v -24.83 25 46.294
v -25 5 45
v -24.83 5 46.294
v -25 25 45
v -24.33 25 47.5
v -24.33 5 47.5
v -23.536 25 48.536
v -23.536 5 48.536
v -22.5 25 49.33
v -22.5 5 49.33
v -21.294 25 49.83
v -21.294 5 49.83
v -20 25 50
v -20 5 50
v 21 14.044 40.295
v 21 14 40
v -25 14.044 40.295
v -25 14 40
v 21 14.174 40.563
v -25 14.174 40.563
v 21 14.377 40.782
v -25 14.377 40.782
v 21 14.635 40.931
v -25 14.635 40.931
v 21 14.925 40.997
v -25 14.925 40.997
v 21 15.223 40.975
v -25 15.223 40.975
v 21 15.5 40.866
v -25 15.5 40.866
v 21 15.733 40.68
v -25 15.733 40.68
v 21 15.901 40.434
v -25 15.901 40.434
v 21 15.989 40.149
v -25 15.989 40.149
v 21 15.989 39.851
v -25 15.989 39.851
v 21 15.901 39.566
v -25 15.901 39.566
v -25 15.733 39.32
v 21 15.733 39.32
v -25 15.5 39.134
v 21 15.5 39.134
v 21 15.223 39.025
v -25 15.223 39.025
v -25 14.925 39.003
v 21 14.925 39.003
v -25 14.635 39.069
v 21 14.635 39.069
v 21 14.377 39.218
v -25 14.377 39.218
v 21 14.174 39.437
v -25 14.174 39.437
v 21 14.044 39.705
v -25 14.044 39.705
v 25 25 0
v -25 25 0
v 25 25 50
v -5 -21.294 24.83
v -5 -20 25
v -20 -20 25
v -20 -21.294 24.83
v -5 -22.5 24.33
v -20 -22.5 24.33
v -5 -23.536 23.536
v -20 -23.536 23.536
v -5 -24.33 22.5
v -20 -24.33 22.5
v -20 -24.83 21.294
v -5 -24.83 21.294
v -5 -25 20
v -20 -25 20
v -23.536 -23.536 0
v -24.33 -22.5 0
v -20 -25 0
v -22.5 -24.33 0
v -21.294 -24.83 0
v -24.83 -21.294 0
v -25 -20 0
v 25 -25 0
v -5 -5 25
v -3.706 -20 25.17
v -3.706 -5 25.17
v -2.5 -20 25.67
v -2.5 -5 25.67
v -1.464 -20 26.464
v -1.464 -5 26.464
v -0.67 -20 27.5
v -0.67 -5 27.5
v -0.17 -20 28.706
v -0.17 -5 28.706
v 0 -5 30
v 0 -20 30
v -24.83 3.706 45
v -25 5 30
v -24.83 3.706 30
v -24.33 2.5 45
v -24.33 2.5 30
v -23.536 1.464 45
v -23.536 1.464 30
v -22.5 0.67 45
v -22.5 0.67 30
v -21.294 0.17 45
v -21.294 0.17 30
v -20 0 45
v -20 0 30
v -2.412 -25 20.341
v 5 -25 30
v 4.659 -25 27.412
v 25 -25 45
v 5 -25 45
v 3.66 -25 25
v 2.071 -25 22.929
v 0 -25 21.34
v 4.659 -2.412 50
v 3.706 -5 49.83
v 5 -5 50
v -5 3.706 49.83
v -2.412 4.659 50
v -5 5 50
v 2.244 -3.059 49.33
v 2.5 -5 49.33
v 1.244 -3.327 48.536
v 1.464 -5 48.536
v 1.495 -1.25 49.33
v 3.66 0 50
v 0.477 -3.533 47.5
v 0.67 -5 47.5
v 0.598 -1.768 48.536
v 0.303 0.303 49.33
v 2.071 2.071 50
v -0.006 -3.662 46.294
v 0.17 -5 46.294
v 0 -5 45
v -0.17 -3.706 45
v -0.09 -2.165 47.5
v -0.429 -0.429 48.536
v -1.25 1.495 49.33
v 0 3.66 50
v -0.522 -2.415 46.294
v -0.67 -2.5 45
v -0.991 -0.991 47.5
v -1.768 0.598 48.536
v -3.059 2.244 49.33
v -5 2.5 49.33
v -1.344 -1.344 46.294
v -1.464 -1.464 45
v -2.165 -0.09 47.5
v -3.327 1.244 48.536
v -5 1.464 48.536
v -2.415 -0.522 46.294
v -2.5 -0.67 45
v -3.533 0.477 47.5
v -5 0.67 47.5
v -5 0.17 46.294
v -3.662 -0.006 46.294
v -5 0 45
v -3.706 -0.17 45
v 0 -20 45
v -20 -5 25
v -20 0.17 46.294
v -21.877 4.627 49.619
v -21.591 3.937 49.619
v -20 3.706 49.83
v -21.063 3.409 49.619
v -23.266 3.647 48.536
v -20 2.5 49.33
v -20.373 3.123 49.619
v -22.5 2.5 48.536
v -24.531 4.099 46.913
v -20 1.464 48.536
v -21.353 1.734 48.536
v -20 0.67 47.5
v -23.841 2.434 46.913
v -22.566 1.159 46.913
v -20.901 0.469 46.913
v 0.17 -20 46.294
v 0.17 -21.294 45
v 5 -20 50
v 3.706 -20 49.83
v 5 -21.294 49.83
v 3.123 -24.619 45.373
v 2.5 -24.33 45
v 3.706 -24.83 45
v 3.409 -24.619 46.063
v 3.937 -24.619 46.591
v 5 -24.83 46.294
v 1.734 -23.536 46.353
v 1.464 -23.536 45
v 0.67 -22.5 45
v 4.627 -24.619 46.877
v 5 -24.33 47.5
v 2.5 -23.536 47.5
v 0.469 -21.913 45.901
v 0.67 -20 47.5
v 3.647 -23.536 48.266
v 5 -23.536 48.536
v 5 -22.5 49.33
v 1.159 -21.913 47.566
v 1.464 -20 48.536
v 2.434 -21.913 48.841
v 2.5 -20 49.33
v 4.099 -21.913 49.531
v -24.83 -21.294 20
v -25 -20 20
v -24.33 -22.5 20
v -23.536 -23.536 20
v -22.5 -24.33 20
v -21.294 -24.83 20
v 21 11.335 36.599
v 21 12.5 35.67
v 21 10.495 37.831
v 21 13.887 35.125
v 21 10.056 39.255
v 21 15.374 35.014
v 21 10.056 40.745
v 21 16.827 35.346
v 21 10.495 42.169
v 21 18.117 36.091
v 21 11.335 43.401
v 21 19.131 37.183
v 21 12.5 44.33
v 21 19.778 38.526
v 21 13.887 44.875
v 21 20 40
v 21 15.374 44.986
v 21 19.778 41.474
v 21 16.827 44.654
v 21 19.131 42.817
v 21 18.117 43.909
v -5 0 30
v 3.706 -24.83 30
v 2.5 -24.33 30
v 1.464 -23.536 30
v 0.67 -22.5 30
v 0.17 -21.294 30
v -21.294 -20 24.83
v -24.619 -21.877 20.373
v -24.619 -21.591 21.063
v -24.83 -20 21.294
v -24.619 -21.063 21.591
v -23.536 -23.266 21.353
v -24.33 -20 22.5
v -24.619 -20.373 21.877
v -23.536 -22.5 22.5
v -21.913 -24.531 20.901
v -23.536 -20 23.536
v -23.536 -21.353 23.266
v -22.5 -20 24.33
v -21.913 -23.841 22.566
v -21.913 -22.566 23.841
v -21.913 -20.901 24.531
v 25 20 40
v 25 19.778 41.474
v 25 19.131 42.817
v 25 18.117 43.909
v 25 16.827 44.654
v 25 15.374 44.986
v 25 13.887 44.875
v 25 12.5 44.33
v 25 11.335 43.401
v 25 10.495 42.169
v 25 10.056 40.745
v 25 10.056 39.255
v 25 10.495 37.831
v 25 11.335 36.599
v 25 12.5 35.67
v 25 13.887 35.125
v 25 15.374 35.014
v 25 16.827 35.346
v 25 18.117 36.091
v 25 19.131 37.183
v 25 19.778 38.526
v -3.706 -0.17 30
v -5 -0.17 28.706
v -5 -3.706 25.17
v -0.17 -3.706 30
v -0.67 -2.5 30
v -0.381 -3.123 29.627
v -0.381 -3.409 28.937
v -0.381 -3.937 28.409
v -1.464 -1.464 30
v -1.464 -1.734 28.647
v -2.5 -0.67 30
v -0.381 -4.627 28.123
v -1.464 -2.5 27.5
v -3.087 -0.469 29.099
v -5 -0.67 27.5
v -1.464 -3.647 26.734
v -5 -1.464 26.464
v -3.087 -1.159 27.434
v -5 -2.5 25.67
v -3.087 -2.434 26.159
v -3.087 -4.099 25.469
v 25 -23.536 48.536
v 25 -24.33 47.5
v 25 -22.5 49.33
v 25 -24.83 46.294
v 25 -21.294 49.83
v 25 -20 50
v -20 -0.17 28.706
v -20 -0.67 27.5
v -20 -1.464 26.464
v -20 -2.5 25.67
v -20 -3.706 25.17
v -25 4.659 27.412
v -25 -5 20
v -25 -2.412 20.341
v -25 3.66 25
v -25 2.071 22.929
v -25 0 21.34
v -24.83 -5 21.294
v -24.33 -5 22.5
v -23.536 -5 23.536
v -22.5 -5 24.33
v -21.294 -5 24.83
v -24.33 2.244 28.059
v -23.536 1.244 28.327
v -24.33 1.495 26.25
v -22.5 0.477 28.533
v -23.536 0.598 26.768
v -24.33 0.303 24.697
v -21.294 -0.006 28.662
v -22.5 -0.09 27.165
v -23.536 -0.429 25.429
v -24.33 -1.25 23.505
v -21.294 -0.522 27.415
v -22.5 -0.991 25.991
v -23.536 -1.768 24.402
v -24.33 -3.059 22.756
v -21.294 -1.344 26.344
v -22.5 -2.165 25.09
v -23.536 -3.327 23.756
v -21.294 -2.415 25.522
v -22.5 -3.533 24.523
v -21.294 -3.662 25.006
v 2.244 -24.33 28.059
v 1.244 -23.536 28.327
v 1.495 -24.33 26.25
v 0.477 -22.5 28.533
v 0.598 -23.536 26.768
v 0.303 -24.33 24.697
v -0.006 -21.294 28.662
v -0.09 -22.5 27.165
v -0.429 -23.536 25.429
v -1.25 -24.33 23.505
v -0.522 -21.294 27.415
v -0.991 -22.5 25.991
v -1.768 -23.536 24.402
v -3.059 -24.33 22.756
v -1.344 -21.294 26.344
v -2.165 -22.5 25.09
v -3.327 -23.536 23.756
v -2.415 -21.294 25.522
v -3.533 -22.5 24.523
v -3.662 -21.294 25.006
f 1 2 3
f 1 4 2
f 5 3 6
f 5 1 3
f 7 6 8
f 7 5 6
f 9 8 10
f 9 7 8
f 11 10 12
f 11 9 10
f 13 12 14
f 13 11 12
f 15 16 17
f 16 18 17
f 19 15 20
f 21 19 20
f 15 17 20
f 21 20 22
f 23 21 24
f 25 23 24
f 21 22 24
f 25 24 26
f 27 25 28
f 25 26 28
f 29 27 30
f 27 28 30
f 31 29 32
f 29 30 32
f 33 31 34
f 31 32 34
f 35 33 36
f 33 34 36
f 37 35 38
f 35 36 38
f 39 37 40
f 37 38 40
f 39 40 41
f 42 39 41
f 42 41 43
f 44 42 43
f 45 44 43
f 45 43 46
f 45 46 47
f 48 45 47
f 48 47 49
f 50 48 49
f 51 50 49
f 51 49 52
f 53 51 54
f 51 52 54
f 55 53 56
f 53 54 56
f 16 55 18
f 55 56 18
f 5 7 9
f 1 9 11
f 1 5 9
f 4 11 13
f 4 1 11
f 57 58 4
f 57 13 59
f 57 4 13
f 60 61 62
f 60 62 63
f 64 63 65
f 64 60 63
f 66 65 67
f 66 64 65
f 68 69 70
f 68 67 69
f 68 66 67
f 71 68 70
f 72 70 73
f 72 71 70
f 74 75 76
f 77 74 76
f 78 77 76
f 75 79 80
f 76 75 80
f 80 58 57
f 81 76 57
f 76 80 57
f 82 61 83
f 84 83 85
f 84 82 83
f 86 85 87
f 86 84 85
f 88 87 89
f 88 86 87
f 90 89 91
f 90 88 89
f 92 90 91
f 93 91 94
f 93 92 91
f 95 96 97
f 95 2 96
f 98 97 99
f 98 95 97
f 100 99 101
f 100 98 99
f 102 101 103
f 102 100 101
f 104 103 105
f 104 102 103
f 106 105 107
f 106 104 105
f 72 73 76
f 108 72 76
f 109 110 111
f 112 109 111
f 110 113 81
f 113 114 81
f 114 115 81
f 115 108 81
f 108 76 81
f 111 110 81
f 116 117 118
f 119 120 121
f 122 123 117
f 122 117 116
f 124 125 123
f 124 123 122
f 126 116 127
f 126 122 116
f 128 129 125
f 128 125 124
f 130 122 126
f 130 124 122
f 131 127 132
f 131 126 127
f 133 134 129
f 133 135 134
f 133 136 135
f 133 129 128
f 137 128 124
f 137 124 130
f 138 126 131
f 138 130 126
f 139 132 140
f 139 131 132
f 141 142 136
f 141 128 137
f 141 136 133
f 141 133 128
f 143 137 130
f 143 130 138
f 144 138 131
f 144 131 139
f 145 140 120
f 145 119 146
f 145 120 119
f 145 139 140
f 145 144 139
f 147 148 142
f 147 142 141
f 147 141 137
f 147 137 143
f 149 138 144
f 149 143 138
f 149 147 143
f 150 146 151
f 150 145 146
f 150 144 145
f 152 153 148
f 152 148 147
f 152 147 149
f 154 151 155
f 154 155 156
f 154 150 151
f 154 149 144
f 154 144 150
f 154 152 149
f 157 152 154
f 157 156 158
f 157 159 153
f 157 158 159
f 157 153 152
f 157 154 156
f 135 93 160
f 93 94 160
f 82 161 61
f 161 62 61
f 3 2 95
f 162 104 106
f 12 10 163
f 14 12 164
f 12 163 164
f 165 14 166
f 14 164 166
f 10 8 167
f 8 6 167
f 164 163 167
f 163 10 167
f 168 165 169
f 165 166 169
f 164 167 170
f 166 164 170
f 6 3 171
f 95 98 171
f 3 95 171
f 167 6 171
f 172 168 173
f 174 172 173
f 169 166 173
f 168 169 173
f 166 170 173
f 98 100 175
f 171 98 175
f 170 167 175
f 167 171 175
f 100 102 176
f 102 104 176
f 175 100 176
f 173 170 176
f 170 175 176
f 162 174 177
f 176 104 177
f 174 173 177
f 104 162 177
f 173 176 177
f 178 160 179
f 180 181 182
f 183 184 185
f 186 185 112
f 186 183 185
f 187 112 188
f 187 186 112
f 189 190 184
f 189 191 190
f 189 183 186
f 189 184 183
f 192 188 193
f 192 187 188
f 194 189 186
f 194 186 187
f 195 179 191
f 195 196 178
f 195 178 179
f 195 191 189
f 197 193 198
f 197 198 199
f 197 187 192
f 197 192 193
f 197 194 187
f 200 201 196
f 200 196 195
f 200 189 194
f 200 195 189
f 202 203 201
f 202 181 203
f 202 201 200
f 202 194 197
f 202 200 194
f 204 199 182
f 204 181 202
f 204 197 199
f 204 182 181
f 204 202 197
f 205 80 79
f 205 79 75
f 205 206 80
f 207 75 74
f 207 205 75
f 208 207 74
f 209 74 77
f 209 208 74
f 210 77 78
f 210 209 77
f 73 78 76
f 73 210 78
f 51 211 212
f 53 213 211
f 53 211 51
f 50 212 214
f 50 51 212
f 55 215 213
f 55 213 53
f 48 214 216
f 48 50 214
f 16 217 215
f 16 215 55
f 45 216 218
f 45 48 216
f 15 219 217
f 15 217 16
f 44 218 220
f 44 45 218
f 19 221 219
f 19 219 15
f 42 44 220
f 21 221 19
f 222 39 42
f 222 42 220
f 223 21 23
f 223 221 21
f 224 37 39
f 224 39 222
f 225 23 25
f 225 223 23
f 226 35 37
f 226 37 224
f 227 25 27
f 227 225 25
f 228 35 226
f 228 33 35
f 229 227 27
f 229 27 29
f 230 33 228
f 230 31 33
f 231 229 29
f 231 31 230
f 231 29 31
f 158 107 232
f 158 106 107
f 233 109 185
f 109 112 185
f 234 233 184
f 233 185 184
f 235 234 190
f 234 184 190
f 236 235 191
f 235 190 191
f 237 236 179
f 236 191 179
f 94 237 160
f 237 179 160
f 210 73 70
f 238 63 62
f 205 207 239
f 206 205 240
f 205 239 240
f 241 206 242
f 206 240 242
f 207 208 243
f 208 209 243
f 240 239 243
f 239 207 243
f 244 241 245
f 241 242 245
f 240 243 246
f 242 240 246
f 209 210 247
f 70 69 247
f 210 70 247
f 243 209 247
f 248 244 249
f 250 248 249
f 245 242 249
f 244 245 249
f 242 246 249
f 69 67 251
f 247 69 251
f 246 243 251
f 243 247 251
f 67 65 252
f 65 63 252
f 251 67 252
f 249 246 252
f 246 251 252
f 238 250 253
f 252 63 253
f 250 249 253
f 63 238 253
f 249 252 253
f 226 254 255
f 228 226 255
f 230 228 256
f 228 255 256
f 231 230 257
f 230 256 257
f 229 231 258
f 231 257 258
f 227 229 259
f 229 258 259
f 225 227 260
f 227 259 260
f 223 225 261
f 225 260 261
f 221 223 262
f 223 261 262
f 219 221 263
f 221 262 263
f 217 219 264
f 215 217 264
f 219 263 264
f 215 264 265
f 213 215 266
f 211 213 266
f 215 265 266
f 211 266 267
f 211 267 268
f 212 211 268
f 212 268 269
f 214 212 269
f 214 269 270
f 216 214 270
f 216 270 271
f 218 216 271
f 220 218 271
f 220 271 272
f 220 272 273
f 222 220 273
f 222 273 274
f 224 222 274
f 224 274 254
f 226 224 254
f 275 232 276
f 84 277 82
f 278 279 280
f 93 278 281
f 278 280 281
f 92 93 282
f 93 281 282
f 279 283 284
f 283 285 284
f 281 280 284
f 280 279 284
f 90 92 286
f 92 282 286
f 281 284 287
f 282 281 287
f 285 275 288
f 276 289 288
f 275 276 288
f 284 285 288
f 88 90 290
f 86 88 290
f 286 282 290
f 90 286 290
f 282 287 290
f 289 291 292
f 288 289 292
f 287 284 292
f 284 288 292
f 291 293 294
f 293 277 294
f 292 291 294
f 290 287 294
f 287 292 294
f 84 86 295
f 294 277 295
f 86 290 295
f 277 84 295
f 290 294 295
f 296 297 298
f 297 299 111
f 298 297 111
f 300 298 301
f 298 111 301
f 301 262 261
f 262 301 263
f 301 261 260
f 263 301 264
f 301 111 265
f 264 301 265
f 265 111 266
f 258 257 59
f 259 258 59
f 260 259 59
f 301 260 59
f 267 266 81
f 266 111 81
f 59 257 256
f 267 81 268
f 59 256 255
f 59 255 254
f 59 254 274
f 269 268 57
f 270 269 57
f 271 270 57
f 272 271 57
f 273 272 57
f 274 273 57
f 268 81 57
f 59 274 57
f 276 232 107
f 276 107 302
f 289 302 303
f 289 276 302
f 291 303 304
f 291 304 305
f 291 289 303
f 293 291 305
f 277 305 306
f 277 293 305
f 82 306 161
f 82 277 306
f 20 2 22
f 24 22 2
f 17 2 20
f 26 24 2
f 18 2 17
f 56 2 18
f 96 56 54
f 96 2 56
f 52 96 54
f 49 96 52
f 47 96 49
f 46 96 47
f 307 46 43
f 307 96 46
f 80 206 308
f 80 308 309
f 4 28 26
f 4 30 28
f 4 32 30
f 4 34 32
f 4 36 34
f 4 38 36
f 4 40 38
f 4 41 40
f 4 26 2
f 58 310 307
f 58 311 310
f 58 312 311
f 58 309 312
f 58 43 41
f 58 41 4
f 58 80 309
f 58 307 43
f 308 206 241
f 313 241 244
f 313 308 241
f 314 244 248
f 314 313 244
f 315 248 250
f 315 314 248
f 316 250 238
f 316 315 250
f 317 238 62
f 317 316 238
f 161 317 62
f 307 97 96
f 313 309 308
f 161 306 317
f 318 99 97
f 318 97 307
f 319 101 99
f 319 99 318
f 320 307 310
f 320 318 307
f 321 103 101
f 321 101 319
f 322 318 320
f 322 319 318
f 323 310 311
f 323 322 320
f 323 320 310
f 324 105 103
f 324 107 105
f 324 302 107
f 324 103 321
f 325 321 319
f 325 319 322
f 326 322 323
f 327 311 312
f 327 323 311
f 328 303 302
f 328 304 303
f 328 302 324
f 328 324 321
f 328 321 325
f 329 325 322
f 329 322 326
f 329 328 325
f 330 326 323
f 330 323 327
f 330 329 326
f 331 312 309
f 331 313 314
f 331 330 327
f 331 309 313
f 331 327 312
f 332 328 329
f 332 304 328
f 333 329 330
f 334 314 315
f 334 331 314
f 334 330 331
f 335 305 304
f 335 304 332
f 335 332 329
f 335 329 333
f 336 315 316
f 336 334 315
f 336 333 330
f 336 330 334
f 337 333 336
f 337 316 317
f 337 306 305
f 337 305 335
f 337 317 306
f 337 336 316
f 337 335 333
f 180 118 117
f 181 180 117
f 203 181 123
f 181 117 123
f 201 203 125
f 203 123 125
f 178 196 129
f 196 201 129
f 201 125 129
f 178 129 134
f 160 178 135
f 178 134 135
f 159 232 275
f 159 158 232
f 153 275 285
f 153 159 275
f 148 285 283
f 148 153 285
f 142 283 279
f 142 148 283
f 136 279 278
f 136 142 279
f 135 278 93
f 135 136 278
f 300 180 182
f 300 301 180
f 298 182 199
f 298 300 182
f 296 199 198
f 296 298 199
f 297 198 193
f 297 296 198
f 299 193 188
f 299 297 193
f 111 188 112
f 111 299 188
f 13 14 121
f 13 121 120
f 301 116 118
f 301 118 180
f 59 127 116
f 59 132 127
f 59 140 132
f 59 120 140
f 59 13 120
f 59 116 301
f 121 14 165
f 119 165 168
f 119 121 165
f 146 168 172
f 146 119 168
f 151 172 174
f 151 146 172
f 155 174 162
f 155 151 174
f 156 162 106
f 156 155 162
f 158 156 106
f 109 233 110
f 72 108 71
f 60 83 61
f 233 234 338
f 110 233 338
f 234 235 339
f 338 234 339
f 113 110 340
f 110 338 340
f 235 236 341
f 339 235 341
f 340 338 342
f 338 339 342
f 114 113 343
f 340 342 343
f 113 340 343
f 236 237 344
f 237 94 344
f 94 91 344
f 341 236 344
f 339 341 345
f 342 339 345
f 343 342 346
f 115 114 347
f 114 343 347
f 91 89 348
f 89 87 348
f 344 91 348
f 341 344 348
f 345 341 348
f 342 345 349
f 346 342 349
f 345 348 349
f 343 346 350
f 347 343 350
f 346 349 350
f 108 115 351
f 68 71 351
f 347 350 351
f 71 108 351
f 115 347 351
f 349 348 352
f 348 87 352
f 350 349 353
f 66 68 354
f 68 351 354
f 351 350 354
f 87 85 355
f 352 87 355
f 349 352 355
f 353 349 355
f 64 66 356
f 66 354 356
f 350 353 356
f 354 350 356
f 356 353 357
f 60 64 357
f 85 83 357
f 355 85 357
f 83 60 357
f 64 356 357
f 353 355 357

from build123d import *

# Parameters (mm, degrees)
F0_W           = 50
F0_H           = 50
F1_DEPTH       = 50
F3_D           = 2
F3_CBORE_D     = 10
F3_CBORE_DEPTH = 4
F4_W           = 25
F4_H           = 25
F5_DEPTH       = 25
F6_R           = 5


with BuildPart() as f1:
    # F0 (on Top) → F1 (new body)
    with BuildSketch(Plane.XY):
        Rectangle(F0_W, F0_H)
    extrude(amount=F1_DEPTH)

    # F3 (through all)
    with Locations(Plane.YZ.offset(25)):
        with Locations((15, 40)):
            CounterBoreHole(F3_D / 2, F3_CBORE_D / 2, F3_CBORE_DEPTH)

    # F4 (on face) → F5 (cut)
    with BuildSketch(Plane.XZ.offset(25)):
        with Locations((-12.5, 37.5)):
            Rectangle(F4_W, F4_H)
    extrude(amount=-F5_DEPTH, mode=Mode.SUBTRACT)

    # F6
    f6_edges = [f1.edges().sort_by_distance(p)[0] for p in [
        (-12.5, 0, 25),
        (-25, 0, 37.5),
        (0, 0, 37.5),
        (0, -12.5, 50),
        (0, -25, 37.5),
        (-12.5, -25, 25),
        (0, -12.5, 25),
        (-25, 12.5, 50),
        (12.5, -25, 50),
        (-25, -25, 12.5),
        (-12.5, 0, 50),
        (-25, -12.5, 25),
    ]]
    fillet(f6_edges, radius=F6_R)


solid = f1.part
